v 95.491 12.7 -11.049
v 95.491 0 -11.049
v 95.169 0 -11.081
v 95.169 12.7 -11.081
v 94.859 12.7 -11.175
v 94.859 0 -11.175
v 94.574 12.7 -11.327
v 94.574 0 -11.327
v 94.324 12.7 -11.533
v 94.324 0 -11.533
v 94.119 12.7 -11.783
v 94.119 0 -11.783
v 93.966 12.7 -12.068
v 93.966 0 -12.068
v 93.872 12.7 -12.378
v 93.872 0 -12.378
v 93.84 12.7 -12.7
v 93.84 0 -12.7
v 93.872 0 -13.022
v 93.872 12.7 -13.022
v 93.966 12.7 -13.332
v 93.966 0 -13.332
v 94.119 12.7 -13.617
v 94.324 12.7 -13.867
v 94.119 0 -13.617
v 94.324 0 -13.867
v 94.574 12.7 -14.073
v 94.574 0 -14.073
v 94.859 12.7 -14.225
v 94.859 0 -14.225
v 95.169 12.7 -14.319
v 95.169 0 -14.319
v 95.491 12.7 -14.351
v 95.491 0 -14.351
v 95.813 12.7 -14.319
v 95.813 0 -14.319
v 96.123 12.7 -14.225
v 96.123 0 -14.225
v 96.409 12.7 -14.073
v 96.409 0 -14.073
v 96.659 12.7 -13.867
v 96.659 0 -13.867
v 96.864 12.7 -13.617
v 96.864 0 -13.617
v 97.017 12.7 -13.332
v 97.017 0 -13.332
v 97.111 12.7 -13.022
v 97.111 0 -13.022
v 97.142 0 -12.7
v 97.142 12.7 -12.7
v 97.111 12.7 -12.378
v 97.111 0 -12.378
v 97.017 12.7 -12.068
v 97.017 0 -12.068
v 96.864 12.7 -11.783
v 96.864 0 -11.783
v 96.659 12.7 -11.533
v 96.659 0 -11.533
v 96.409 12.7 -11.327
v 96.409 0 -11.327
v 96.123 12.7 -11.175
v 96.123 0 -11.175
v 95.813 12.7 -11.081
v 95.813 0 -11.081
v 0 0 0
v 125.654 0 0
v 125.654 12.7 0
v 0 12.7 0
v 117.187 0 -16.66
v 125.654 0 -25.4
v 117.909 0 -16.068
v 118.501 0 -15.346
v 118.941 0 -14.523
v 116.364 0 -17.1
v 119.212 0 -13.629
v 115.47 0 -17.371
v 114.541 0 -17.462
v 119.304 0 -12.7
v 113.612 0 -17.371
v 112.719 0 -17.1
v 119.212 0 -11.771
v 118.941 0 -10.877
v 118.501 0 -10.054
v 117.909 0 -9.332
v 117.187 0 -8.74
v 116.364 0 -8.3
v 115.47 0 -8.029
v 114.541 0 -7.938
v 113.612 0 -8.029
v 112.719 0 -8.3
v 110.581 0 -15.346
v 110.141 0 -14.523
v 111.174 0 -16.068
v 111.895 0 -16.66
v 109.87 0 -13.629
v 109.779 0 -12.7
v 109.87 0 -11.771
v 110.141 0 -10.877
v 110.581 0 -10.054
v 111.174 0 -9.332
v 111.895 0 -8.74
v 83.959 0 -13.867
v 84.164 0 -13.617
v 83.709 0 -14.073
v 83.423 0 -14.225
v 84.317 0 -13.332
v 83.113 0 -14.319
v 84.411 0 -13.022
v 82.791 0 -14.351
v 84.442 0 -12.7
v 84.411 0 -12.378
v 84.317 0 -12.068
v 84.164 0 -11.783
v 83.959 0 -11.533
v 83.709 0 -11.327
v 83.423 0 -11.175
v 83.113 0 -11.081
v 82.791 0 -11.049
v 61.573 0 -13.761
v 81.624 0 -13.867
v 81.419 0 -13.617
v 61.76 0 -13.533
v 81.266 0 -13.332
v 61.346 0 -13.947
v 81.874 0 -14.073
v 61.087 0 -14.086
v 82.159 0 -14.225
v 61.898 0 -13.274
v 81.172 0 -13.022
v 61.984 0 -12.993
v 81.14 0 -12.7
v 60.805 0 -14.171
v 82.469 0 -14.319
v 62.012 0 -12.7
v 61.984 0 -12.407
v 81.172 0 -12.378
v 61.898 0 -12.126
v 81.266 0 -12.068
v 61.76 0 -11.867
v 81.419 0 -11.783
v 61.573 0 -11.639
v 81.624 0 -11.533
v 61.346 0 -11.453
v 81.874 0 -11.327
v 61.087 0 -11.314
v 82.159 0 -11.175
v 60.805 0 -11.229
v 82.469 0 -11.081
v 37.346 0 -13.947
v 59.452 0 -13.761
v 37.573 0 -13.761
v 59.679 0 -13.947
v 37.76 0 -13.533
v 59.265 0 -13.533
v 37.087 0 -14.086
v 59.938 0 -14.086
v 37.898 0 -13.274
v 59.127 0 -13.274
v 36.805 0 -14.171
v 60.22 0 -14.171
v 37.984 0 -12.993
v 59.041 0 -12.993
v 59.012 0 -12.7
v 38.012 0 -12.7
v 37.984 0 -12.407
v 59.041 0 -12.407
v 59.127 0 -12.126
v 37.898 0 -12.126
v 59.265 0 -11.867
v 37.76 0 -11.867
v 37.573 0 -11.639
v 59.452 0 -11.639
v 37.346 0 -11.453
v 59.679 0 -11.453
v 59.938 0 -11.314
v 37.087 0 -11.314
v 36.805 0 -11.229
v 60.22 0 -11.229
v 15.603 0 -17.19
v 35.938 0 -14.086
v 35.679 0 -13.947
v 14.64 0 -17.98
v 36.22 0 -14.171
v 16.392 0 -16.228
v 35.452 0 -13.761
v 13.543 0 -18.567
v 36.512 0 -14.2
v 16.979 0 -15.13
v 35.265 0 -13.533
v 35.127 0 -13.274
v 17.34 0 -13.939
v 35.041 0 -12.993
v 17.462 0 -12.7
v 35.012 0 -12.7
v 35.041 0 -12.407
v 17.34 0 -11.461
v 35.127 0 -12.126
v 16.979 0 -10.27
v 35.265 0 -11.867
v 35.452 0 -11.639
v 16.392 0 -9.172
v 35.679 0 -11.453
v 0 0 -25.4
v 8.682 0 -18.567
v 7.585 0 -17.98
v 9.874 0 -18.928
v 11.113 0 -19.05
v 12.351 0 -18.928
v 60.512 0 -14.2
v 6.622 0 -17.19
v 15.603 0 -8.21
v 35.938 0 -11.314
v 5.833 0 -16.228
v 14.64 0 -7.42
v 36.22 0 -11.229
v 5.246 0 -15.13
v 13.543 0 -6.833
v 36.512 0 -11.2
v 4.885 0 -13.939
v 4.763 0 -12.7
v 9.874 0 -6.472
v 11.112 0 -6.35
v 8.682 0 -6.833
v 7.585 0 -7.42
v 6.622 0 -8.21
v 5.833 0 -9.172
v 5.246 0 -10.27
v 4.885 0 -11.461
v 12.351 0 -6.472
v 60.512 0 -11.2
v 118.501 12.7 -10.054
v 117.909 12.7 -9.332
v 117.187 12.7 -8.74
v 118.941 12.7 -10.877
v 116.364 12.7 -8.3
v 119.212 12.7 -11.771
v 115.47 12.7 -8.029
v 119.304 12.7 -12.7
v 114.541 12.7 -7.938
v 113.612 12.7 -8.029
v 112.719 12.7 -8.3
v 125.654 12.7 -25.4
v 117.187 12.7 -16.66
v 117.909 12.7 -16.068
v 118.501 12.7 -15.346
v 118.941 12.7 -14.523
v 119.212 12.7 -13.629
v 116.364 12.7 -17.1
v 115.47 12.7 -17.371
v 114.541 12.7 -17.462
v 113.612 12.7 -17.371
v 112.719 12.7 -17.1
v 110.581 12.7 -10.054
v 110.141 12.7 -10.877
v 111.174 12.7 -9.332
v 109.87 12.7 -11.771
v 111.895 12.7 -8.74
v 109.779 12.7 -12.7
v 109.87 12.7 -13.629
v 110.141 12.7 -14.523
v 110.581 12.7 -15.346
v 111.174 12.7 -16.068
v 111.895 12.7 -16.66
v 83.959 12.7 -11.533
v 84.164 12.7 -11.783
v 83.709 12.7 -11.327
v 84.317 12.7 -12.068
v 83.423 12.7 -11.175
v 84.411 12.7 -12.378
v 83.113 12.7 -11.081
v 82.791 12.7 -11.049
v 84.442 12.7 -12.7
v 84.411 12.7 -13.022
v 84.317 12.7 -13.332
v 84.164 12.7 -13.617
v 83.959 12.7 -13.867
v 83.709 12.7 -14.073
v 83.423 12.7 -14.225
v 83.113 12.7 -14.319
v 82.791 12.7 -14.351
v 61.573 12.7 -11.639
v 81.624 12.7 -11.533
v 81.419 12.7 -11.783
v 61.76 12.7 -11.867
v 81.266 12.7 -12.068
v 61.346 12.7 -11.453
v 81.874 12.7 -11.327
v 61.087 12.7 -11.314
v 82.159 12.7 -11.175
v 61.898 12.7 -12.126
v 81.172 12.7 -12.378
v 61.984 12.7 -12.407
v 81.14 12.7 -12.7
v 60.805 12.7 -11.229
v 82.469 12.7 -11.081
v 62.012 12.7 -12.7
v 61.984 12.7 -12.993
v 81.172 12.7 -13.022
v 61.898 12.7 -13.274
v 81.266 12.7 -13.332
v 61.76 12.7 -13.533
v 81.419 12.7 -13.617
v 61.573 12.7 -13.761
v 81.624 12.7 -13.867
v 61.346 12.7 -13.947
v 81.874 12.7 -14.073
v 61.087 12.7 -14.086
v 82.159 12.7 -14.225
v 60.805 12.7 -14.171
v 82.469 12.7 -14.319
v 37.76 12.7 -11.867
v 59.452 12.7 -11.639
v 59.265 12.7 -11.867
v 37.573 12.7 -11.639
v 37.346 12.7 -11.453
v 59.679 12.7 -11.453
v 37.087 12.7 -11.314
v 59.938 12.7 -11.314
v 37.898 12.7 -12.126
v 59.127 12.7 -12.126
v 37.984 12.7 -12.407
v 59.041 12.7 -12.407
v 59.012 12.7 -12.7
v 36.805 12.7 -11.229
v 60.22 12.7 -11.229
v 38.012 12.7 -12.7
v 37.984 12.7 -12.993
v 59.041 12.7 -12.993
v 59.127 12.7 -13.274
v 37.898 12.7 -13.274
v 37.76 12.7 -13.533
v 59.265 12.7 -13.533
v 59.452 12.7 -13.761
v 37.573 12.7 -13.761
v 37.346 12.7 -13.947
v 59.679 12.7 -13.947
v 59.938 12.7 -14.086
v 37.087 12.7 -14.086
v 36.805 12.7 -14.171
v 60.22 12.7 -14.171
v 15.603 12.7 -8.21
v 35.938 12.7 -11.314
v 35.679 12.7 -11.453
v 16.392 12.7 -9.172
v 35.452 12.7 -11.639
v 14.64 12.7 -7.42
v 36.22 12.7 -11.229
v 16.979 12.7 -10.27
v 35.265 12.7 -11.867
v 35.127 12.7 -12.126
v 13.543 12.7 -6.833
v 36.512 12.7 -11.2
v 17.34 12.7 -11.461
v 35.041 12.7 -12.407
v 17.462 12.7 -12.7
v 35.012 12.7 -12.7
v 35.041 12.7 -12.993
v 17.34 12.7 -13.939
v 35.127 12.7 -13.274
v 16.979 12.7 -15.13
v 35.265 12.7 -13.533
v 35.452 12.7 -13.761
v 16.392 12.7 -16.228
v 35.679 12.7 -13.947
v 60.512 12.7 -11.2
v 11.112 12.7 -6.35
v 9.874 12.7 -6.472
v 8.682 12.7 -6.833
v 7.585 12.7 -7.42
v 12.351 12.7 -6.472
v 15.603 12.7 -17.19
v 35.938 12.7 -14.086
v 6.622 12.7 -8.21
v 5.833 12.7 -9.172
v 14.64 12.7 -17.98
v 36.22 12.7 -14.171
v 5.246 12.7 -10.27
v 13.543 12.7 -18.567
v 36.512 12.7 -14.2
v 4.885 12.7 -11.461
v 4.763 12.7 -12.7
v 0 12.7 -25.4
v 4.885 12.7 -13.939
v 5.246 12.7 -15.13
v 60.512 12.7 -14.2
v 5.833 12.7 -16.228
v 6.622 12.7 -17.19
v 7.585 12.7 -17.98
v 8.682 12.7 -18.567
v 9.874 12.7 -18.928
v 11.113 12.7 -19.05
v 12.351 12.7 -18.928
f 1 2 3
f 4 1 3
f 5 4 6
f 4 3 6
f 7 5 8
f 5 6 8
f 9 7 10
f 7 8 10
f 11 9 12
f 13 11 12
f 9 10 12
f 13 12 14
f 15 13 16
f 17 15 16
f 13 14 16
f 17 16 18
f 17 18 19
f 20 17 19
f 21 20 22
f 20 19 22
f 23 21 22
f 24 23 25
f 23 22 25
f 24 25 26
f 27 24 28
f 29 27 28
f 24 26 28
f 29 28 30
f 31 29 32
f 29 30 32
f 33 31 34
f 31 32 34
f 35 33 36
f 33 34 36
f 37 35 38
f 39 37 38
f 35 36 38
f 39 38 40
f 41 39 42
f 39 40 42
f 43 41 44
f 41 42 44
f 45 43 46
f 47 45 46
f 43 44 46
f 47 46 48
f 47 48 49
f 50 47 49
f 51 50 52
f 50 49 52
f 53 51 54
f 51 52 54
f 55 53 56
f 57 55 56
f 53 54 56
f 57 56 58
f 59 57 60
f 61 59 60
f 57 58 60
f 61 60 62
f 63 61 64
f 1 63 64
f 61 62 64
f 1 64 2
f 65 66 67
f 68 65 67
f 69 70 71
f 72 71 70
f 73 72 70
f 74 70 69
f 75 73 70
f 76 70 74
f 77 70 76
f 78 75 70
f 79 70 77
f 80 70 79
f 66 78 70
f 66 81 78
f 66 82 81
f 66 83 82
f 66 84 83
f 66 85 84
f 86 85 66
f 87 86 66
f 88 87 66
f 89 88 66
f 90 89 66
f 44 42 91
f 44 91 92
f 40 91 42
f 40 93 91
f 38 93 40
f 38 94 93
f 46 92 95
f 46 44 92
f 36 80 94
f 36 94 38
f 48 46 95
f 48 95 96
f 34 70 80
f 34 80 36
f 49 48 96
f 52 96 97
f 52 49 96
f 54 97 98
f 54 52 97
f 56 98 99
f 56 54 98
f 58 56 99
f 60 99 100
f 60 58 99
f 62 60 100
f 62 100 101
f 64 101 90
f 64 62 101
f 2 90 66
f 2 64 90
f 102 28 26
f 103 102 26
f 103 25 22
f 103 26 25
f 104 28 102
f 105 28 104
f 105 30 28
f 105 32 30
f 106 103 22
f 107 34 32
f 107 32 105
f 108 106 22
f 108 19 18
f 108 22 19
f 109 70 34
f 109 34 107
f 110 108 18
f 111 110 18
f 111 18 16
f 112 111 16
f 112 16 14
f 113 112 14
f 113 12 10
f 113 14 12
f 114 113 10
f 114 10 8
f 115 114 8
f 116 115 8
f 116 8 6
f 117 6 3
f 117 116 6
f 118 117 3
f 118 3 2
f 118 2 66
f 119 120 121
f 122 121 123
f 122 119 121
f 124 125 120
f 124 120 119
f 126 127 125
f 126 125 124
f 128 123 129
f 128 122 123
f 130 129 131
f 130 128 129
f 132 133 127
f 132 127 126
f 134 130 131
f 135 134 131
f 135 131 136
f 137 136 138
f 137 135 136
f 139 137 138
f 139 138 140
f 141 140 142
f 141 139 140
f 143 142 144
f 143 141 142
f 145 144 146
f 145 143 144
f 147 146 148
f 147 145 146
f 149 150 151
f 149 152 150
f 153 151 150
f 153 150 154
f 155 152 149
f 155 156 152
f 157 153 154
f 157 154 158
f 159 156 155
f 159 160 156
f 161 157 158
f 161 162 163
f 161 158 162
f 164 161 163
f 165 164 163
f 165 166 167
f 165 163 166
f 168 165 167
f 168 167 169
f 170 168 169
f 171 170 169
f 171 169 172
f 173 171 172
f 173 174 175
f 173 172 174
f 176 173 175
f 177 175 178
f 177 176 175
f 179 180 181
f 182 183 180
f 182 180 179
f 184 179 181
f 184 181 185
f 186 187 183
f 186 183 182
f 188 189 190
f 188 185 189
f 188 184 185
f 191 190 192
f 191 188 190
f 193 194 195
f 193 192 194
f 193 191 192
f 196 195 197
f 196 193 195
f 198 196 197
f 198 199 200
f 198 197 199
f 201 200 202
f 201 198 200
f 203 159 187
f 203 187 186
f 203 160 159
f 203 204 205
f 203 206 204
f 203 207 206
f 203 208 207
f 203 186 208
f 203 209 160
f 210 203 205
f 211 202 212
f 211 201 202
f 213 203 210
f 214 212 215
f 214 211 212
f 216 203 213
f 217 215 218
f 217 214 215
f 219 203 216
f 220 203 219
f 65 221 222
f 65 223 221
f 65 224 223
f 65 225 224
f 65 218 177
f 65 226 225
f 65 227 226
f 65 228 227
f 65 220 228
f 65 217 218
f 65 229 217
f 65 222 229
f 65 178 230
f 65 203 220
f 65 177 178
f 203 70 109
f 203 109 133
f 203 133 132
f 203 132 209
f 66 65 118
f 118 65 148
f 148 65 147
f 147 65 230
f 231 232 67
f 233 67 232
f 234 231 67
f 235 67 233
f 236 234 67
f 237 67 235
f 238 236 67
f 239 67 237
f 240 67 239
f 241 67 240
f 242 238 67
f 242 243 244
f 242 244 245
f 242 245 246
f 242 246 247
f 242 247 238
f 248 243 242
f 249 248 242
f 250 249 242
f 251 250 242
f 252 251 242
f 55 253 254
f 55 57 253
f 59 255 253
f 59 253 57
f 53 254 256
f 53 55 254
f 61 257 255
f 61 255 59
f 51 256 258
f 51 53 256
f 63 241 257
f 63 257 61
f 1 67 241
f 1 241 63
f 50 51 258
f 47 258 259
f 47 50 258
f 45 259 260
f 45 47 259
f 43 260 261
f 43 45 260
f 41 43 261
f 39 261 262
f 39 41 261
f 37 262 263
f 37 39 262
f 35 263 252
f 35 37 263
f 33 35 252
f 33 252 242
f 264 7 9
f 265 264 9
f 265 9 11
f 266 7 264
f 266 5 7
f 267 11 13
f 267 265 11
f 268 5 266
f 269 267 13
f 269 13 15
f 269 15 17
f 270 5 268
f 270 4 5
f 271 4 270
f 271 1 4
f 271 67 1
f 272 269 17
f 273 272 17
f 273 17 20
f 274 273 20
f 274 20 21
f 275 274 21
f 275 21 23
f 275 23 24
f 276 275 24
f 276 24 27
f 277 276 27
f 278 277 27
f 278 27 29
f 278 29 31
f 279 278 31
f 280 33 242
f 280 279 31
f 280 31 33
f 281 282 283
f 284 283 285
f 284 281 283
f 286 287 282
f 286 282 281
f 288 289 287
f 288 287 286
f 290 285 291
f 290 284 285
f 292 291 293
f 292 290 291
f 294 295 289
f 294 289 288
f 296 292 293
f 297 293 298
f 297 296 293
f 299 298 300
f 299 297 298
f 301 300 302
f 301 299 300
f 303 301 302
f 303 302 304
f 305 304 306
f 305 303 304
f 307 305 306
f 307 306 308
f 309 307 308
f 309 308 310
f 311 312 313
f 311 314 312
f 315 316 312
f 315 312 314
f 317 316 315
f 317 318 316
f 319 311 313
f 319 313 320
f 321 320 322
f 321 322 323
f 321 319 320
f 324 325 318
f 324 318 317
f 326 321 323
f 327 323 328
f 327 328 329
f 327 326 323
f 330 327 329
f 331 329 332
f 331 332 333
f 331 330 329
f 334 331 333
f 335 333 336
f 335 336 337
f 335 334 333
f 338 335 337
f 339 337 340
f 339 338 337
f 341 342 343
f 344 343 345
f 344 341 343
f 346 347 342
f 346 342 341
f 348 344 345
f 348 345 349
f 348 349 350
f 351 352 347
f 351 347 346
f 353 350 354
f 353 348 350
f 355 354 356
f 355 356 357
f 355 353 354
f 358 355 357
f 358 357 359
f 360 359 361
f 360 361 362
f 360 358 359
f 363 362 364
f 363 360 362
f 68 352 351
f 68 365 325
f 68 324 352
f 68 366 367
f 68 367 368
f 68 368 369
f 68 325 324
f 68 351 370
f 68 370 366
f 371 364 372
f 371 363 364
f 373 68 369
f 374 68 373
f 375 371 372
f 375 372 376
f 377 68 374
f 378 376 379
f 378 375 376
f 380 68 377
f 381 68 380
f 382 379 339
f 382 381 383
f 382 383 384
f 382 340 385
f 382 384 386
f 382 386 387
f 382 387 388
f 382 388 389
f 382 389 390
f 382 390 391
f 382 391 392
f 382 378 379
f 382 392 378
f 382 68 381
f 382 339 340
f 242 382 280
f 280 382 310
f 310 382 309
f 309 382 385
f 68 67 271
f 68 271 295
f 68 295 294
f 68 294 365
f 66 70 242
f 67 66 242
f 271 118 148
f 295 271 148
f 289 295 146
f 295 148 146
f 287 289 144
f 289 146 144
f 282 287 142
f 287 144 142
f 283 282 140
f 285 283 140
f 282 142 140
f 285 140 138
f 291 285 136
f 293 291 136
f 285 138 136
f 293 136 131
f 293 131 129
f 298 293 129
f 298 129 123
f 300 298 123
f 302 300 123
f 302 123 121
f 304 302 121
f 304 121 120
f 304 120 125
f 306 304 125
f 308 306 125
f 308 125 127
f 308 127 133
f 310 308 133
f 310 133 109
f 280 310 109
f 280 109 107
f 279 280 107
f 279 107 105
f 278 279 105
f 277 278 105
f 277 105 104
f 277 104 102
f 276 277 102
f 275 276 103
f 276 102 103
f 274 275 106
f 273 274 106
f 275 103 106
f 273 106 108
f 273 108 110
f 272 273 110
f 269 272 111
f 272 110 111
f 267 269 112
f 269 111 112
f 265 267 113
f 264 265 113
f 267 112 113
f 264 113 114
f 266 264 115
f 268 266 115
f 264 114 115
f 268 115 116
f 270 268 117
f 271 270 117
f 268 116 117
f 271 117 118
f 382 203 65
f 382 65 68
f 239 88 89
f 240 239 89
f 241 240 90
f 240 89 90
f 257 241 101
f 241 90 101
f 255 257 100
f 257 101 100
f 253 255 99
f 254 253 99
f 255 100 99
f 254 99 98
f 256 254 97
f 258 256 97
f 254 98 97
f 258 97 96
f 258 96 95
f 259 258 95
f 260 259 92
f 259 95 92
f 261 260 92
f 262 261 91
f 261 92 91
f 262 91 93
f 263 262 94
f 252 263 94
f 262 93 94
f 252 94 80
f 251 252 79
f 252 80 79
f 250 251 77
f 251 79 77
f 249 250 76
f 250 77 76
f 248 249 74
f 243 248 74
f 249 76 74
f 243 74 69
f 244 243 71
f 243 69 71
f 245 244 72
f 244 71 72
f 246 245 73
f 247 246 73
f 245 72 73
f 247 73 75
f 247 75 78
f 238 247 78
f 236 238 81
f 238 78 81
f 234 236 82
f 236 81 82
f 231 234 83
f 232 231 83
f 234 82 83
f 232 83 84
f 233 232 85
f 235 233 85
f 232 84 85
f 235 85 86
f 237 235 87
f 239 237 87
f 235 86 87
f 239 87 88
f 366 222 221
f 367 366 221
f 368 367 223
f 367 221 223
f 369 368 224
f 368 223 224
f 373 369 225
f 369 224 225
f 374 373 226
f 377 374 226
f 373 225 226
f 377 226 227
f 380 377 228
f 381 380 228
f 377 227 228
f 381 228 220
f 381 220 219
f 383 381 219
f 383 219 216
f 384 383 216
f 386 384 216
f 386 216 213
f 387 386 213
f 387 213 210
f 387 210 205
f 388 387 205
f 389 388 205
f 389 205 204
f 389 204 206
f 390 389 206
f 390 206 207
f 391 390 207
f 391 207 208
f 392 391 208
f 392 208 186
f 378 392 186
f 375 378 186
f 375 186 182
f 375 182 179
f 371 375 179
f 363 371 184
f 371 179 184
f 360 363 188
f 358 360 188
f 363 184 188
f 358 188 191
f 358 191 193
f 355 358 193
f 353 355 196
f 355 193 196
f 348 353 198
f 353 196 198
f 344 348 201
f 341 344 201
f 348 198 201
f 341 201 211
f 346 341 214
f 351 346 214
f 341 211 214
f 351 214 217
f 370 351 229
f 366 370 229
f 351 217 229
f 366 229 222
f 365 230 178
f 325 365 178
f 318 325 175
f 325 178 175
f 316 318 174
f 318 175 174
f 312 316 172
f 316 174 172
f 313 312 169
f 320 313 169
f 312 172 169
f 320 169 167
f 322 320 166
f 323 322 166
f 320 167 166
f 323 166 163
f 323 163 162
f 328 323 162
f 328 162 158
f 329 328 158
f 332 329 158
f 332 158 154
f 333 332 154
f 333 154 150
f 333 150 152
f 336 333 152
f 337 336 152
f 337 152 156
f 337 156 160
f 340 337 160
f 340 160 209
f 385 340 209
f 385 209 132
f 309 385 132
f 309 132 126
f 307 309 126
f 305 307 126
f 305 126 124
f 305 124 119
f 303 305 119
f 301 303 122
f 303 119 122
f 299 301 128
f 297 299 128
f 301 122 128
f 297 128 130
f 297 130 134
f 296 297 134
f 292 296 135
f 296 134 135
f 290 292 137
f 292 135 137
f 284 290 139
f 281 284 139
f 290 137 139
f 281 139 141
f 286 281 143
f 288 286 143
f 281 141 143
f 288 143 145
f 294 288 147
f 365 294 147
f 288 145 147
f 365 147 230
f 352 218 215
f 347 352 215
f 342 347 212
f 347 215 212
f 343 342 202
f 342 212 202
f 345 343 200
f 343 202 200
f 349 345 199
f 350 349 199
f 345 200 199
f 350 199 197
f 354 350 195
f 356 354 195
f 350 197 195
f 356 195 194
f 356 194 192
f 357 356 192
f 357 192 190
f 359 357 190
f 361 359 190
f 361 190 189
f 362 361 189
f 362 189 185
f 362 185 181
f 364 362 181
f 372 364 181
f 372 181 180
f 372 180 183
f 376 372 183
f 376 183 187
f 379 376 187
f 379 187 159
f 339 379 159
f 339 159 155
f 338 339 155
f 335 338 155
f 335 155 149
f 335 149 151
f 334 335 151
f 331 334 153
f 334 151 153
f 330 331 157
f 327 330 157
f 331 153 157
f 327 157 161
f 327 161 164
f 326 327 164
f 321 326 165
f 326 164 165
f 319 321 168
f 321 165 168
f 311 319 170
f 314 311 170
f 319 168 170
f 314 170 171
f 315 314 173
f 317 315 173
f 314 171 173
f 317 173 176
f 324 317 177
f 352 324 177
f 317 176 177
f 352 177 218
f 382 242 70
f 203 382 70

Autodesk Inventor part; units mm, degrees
ref_plane "YZ Plane" through (0, 0, 0) normal (1, 0, 0) x (0, 1, 0)
ref_plane "XZ Plane" through (0, 0, 0) normal (0, 1, 0) x (-1, 0, 0)
ref_plane "XY Plane" through (0, 0, 0) normal (0, 0, 1) x (1, 0, 0)
sketch "Sketch1" plane through (0, 0, 0) normal (1, 0, 0) x (0, 1, 0)
  line L0 (0, 0) -> (12.7, 0)
  line L1 (12.7, 0) -> (12.7, -25.4)
  line L2 (12.7, -25.4) -> (0, -25.4)
  line L3 (0, -25.4) -> (0, 0)
  dimension "d0" = 12.7
  dimension "d1" = 25.4
extrude "Extrusion1" add sketch "Sketch1" along normal blind 125.6538
sketch "Sketch3" plane through (0, 12.7, 0) normal (0, 1, 0) x (1, 0, 0)
  line L0 (0, 0) -> (125.6538, 0) projected
  line L1 (0, 25.4) -> (125.6538, 25.4) projected
  circle A0 centre (11.1125, 12.7) radius 6.35 projected
  circle A1 centre (114.5413, 12.7) radius 6.35 projected
  point P0 (36.5125, 12.7)
  point P1 (60.5125, 12.7)
  dimension "d13" = 25.4
  dimension "d14" = 12.7
  dimension "d16" = 24
  dimension "d36" = 25.4
hole "Hole1" at (36.5125, 12.7, -12.7) at (60.5125, 12.7, -12.7) direction (0, -1, 0) diameter 3 end through all
sketch "Sketch5" plane through (0, 12.7, 0) normal (0, 1, 0) x (1, 0, 0)
  line L0 (0, 0) -> (125.6538, 0) projected
  line L1 (0, 25.4) -> (125.6538, 25.4) projected
  circle A0 centre (114.5413, 12.7) radius 6.35 projected
  point P0 (95.4913, 12.7)
  dimension "d26" = 12.7
  dimension "d27" = 25.4
  dimension "d28" = 19.05
hole "Hole2" at (95.4913, 12.7, -12.7) direction (0, -1, 0) diameter 3.302 end through all thread size "8-32 UNC" class "2B" standard "ANSI Unified Screw Threads"
sketch "Sketch12" plane through (0, 12.7, 0) normal (0, 1, 0) x (1, 0, 0)
  circle A0 centre (95.4913, 12.7) radius 1.651 projected
  circle A1 centre (36.5125, 12.7) radius 1.5 projected
  circle A2 centre (60.5125, 12.7) radius 1.5 projected
  line L0 (0, 0) -> (0, 25.4) projected
  line L1 (0, 0) -> (125.6538, 0) projected
  line L2 (125.6538, 25.4) -> (125.6538, 0) projected
  line L3 (0, 25.4) -> (125.6538, 25.4) projected
  point P0 (0, 0)
  point P1 (82.7913, 12.7)
  dimension "d77" = 12.7
  dimension "d78" = 12.7
  dimension "d79" = 12.7
hole "Hole5" at (82.7913, 12.7, -12.7) direction (0, -1, 0) diameter 3.302 end through all thread size "8-32 UNC" class "2B" standard "ANSI Unified Screw Threads"
sketch "Sketch14" plane through (0, 12.7, 0) normal (0, 1, 0) x (1, 0, 0)
  circle A0 centre (82.7913, 12.7) radius 1.651 projected
  circle A1 centre (95.4913, 12.7) radius 1.651 projected
  circle A2 centre (36.5125, 12.7) radius 1.5 projected
  circle A3 centre (60.5125, 12.7) radius 1.5 projected
  line L0 (0, 0) -> (0, 25.4) projected
  line L1 (0, 0) -> (125.6538, 0) projected
  line L2 (125.6538, 25.4) -> (125.6538, 0) projected
  line L3 (0, 25.4) -> (125.6538, 25.4) projected
  point P0 (0, 0)
  point P1 (11.1125, 12.7)
hole "Hole7" at (11.1125, 12.7, -12.7) direction (0, -1, 0) diameter 12.7 end through all
sketch "Sketch15" plane through (0, 12.7, 0) normal (0, 1, 0) x (1, 0, 0)
  circle A0 centre (11.1125, 12.7) radius 6.35 projected
  circle A1 centre (82.7913, 12.7) radius 1.651 projected
  circle A2 centre (95.4913, 12.7) radius 1.651 projected
  circle A3 centre (36.5125, 12.7) radius 1.5 projected
  circle A4 centre (60.5125, 12.7) radius 1.5 projected
  line L0 (0, 0) -> (0, 25.4) projected
  line L1 (0, 0) -> (125.6538, 0) projected
  line L2 (125.6538, 25.4) -> (125.6538, 0) projected
  line L3 (0, 25.4) -> (125.6538, 25.4) projected
  circle A5 centre (114.5413, 12.7) radius 4.7625 projected
  point P0 (0, 0)
hole "Hole8" at (114.5413, 12.7, -12.7) direction (0, -1, 0) diameter 9.525 end through all
equation "\"d14\" = 0.5 * d13"
equation "\"d26\" = 0.5 * d27"
equation "\"d79\" = d78"
properties part number "L17_TSI_005"
